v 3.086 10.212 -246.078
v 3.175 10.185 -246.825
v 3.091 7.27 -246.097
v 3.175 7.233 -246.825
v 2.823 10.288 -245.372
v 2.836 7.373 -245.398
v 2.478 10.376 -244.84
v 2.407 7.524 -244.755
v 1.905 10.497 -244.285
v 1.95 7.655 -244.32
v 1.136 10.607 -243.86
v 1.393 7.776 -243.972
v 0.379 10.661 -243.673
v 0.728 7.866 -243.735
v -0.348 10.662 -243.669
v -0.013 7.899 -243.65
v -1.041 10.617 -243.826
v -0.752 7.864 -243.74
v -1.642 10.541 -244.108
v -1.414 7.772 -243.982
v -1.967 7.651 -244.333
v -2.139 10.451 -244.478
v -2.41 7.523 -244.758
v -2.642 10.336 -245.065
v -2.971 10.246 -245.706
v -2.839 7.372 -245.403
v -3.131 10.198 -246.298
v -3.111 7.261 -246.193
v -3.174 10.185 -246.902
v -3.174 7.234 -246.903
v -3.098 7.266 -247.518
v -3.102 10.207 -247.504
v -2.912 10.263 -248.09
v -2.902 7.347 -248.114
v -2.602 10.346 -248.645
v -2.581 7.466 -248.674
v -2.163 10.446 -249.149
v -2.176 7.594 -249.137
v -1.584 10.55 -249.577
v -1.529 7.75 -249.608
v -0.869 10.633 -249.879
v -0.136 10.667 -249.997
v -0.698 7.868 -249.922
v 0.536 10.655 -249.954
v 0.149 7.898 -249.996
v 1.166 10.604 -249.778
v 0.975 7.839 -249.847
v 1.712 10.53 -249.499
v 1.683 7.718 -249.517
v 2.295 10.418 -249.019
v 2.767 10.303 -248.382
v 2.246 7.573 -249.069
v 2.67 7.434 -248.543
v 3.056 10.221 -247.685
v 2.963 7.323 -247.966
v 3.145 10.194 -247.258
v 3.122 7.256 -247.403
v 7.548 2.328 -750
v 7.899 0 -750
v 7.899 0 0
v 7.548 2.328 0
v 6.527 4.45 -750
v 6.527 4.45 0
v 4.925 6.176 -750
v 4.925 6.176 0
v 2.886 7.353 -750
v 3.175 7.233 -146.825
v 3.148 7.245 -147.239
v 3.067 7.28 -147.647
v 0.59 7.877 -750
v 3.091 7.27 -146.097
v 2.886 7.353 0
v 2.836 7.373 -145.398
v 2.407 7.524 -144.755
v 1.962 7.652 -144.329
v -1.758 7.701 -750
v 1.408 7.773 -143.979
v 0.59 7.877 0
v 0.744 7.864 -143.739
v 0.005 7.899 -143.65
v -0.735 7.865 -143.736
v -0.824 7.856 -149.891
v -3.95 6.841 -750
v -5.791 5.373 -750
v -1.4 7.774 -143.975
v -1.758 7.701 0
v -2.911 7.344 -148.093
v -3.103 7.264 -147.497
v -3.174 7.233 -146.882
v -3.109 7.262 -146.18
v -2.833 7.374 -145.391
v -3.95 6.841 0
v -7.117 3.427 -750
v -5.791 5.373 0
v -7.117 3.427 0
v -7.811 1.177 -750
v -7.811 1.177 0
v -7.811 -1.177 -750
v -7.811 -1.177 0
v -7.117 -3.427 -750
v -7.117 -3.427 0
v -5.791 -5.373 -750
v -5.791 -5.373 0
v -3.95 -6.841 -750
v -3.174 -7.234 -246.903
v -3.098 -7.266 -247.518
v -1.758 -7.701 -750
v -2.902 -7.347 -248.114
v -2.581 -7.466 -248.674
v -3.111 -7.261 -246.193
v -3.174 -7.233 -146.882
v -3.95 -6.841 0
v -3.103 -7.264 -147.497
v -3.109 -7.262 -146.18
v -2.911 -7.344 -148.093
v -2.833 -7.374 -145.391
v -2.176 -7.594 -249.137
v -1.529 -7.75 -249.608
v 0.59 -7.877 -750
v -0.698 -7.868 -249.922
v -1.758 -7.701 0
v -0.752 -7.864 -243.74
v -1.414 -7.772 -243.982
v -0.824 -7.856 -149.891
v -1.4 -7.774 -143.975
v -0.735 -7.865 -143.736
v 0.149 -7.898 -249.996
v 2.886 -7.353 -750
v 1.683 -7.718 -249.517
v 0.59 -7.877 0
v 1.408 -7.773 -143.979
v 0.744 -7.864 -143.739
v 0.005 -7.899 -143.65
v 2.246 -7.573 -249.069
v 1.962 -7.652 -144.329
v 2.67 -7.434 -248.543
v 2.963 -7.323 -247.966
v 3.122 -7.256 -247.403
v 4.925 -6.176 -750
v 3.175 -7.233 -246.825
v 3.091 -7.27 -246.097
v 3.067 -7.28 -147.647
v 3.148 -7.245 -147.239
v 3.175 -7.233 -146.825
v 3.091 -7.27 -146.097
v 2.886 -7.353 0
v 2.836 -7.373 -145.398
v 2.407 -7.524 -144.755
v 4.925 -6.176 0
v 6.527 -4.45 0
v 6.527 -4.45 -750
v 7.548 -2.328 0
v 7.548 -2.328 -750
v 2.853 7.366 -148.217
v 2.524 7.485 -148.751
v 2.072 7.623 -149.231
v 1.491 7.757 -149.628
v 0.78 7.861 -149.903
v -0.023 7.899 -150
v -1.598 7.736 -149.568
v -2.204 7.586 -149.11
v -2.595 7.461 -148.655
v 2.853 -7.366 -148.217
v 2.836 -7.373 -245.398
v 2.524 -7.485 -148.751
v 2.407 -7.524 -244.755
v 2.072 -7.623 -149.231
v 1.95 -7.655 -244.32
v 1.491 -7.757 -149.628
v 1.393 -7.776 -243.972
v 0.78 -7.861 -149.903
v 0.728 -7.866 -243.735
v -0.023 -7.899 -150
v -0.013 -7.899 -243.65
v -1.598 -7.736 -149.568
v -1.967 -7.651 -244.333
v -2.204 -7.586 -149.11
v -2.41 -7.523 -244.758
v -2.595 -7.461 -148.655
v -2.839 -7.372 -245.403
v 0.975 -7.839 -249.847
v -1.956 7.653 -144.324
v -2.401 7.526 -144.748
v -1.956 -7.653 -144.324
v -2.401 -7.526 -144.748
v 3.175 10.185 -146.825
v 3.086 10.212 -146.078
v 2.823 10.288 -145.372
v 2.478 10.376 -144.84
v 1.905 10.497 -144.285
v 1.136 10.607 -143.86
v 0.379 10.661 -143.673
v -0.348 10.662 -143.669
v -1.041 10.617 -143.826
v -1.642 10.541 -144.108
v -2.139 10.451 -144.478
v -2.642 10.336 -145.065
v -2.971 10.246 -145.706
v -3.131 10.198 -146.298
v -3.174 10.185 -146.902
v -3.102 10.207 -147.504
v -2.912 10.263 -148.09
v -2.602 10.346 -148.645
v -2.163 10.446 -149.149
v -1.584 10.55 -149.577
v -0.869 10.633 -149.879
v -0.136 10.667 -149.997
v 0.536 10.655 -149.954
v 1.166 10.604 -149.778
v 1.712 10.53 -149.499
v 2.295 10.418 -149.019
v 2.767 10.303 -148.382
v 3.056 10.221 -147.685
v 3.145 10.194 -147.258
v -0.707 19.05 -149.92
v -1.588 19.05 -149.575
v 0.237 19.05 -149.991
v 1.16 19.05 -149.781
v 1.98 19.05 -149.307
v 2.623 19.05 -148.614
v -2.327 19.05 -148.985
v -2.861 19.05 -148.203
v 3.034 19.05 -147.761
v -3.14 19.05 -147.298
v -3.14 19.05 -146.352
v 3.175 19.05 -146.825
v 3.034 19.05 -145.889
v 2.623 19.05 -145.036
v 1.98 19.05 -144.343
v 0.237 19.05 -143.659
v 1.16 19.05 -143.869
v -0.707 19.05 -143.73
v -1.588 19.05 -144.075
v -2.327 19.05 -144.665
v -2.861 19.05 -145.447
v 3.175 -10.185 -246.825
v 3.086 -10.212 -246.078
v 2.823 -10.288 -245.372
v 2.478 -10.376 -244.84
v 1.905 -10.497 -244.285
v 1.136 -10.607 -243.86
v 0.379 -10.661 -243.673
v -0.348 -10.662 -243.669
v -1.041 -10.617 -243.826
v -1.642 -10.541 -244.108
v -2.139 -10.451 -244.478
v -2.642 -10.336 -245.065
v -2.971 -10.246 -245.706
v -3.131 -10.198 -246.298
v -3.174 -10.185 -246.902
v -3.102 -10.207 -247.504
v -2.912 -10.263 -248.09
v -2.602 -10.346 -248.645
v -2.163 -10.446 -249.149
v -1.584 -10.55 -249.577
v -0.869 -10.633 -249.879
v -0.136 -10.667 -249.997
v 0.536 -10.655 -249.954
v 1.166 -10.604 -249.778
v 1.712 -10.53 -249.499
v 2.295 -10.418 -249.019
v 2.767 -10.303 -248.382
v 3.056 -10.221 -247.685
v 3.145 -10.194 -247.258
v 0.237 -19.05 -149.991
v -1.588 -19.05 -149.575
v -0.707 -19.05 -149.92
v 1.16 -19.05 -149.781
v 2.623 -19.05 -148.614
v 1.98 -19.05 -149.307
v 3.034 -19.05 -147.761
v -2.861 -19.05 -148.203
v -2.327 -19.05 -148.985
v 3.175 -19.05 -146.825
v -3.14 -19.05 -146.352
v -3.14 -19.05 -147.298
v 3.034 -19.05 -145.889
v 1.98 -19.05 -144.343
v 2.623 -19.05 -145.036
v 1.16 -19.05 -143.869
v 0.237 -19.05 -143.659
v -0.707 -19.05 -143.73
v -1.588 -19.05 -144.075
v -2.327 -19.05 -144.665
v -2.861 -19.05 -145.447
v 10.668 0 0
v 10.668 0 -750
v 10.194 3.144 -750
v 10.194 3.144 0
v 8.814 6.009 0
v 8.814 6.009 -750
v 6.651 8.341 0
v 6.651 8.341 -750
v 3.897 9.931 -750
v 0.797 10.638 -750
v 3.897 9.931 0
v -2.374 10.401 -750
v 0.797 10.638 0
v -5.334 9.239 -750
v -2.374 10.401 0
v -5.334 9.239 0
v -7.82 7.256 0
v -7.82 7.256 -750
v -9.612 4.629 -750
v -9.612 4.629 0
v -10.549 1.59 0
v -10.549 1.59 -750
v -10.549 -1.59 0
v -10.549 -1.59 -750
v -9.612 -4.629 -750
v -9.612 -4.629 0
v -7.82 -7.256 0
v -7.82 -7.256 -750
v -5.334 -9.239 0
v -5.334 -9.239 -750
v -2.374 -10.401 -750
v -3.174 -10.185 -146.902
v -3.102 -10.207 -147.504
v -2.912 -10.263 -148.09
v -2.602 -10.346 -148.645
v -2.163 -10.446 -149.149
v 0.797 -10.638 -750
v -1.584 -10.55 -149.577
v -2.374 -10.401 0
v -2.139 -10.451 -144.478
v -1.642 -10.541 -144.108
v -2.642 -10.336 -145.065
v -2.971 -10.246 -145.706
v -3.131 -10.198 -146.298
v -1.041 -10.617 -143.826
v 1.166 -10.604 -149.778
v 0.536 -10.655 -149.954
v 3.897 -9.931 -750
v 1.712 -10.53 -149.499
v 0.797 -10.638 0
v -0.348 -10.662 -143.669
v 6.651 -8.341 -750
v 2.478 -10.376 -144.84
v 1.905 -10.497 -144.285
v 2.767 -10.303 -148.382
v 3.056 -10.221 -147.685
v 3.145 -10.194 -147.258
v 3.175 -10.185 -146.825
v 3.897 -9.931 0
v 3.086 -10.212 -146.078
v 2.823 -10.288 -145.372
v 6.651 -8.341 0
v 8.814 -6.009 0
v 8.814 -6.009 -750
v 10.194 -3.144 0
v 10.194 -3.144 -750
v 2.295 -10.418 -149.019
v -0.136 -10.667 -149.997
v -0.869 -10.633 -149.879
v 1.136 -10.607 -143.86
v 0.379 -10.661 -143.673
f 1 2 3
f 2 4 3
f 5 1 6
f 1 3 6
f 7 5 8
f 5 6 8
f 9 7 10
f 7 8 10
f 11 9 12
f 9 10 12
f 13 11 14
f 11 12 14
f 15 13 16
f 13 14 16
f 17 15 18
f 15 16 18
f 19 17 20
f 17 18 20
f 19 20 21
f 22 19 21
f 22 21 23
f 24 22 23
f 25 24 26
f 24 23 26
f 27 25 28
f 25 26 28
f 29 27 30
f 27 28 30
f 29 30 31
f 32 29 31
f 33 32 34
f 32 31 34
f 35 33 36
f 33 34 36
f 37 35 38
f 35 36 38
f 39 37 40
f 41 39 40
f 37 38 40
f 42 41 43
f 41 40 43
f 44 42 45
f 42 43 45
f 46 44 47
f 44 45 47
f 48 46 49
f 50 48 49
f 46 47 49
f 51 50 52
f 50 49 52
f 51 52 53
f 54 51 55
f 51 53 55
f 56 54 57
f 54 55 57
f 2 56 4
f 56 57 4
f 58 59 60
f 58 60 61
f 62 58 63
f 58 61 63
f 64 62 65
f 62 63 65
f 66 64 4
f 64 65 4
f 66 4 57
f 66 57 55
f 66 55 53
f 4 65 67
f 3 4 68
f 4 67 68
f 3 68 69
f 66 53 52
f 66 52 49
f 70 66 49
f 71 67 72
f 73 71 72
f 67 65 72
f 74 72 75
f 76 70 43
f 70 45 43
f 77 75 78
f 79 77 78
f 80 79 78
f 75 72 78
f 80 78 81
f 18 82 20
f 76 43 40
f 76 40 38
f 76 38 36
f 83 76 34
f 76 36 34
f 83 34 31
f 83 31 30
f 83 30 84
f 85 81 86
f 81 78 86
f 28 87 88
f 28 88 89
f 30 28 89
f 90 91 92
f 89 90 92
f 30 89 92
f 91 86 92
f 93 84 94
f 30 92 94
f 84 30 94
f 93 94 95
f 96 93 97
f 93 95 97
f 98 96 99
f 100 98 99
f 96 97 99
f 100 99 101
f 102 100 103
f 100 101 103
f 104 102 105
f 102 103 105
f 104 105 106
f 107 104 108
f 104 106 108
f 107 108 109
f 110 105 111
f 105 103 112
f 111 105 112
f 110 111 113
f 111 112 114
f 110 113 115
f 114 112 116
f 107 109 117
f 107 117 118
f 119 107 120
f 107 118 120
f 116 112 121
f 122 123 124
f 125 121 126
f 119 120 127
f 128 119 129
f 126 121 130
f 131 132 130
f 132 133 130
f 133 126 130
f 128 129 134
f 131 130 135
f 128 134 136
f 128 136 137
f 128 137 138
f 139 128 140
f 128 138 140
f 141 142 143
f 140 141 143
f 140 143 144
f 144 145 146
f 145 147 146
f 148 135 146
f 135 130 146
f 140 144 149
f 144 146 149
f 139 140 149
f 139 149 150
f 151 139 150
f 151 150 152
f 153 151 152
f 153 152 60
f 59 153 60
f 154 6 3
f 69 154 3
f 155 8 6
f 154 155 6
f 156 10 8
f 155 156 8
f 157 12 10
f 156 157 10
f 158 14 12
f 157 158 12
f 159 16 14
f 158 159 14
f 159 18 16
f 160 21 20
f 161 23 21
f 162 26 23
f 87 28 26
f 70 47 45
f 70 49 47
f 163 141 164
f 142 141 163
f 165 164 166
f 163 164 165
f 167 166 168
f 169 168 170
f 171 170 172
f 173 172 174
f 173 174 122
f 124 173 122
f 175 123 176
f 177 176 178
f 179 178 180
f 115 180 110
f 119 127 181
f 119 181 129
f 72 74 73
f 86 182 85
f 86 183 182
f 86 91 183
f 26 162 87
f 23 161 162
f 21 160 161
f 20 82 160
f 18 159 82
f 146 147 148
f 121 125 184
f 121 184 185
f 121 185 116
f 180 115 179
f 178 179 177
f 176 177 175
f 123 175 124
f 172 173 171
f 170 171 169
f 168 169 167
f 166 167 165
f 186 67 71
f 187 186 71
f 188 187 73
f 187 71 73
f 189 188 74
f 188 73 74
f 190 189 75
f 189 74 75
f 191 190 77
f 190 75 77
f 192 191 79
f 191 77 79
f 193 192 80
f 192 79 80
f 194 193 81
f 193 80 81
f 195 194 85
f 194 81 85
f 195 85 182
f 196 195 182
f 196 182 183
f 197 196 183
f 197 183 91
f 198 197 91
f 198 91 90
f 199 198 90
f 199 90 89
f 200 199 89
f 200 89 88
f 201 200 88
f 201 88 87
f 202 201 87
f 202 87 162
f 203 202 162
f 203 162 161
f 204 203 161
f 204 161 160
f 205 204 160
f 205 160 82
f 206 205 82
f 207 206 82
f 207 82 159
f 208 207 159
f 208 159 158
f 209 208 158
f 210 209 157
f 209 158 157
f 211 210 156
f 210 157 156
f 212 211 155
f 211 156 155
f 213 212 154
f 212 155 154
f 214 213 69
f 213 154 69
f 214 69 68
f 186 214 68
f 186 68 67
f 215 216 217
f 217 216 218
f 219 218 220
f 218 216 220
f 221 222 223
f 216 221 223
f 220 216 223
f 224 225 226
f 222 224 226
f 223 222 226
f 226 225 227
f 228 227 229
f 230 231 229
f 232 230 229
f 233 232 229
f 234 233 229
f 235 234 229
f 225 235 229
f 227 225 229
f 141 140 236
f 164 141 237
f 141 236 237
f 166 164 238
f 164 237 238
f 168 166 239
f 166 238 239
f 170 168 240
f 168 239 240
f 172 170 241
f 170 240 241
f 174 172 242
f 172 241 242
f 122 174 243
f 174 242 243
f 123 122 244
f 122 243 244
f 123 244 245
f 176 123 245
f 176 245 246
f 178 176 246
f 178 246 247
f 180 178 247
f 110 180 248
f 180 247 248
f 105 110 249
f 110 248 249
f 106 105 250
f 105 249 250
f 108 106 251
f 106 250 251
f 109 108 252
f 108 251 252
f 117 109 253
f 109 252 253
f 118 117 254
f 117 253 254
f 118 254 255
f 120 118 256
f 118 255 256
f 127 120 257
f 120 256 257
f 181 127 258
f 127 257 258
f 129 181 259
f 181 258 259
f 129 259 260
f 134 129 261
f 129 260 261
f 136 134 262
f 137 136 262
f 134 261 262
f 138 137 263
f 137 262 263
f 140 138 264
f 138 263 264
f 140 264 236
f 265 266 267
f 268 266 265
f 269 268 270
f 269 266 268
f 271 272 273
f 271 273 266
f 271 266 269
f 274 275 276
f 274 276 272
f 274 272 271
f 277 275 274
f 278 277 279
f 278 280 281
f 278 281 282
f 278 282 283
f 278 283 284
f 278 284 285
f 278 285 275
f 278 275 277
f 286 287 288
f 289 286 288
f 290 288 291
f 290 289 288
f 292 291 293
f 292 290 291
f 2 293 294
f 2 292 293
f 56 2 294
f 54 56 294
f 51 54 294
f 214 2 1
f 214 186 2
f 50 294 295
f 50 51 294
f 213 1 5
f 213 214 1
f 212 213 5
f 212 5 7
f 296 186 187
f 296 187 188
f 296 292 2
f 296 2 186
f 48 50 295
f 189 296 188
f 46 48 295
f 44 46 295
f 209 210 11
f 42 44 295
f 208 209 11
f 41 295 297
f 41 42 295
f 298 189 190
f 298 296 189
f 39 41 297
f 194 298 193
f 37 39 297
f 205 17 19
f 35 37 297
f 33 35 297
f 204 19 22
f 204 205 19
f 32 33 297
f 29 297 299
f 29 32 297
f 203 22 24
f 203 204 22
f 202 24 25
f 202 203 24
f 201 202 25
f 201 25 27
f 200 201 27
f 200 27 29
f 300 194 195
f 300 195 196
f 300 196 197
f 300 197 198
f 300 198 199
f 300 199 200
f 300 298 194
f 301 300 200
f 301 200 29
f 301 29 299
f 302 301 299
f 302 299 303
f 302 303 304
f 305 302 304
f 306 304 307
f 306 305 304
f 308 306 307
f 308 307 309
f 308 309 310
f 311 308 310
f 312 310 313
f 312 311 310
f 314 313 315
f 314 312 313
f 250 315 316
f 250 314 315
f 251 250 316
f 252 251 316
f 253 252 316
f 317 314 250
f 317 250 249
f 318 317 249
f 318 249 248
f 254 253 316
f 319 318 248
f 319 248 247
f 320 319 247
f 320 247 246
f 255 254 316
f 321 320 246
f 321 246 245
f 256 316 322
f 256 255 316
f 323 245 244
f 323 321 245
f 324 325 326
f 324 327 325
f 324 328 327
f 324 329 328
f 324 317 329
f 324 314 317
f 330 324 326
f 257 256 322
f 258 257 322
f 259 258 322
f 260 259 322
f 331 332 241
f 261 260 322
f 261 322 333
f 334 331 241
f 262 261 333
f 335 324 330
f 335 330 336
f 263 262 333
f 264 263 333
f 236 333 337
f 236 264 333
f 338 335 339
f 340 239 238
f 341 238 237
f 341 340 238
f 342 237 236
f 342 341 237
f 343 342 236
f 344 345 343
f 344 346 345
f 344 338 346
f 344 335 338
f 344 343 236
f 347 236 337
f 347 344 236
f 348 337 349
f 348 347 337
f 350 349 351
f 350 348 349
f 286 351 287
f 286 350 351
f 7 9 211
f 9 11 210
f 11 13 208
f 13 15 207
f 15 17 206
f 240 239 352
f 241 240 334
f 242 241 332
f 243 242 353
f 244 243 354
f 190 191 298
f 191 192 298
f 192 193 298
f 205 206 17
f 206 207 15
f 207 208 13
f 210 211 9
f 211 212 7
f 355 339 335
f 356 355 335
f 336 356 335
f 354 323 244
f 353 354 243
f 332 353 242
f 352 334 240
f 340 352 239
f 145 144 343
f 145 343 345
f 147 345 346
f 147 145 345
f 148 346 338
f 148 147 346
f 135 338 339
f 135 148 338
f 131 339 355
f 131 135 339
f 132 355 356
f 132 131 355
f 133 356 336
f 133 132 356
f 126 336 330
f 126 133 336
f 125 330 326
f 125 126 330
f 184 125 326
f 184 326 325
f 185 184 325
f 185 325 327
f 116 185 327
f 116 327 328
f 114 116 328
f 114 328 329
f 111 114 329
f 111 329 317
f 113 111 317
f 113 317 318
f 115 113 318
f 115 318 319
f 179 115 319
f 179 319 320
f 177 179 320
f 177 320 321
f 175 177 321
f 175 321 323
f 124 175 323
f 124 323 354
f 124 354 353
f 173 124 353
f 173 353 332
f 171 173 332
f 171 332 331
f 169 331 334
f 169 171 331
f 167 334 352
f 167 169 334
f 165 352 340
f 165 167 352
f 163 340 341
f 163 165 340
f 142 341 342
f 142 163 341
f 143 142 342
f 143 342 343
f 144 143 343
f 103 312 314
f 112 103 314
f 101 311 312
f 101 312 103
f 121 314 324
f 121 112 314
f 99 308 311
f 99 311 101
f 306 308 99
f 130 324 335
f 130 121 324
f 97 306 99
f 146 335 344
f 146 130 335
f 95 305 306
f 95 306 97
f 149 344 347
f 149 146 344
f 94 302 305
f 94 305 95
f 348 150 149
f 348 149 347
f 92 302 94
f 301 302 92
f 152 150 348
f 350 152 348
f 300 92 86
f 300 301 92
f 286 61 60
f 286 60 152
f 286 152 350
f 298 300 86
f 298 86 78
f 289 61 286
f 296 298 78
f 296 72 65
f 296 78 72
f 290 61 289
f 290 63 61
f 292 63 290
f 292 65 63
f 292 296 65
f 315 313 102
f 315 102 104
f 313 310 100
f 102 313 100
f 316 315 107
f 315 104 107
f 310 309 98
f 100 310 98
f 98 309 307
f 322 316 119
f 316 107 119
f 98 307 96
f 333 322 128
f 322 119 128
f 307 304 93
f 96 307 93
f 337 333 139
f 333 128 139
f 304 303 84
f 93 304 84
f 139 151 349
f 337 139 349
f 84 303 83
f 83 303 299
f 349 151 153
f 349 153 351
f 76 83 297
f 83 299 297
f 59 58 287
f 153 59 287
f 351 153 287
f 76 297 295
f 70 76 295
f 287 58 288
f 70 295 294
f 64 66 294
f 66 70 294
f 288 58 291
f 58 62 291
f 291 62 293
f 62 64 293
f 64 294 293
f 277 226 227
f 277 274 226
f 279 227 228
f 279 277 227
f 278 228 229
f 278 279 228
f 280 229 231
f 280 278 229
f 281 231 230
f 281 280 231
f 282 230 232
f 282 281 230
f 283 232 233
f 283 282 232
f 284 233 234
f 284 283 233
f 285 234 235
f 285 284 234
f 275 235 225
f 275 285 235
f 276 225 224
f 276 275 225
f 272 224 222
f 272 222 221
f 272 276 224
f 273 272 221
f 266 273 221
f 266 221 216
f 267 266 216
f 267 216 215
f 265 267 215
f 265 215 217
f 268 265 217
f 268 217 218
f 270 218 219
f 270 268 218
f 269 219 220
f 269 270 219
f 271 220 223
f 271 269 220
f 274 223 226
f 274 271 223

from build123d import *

# Parameters (mm, degrees)
F0_R     = 10.668
F0_R_2   = 7.8994
F1_DEPTH = 750
F2_R     = 3.175
F3_DEPTH = 12.7
F4_DEPTH = 19.05


with BuildPart() as f1:
    # F0 (on Top) → F1 (new body)
    with BuildSketch(Plane.XY):
        Circle(F0_R)
        Circle(F0_R_2, mode=Mode.SUBTRACT)
    extrude(amount=-F1_DEPTH)

    # F2 (on Front) → F3 (cut, symmetric)
    with BuildSketch(Plane.XZ):
        with Locations((0, -146.825)):
            Circle(F2_R)
        with Locations((0, -246.825)):
            Circle(F2_R)
    extrude(amount=F3_DEPTH, both=True, mode=Mode.SUBTRACT)


with BuildPart() as f4:
    # F2 (on Front) → F4 (new body, symmetric)
    with BuildSketch(Plane.XZ):
        with Locations((0, -146.825)):
            Circle(F2_R)
    extrude(amount=F4_DEPTH, both=True)


solid = Compound([f1.part, f4.part])
